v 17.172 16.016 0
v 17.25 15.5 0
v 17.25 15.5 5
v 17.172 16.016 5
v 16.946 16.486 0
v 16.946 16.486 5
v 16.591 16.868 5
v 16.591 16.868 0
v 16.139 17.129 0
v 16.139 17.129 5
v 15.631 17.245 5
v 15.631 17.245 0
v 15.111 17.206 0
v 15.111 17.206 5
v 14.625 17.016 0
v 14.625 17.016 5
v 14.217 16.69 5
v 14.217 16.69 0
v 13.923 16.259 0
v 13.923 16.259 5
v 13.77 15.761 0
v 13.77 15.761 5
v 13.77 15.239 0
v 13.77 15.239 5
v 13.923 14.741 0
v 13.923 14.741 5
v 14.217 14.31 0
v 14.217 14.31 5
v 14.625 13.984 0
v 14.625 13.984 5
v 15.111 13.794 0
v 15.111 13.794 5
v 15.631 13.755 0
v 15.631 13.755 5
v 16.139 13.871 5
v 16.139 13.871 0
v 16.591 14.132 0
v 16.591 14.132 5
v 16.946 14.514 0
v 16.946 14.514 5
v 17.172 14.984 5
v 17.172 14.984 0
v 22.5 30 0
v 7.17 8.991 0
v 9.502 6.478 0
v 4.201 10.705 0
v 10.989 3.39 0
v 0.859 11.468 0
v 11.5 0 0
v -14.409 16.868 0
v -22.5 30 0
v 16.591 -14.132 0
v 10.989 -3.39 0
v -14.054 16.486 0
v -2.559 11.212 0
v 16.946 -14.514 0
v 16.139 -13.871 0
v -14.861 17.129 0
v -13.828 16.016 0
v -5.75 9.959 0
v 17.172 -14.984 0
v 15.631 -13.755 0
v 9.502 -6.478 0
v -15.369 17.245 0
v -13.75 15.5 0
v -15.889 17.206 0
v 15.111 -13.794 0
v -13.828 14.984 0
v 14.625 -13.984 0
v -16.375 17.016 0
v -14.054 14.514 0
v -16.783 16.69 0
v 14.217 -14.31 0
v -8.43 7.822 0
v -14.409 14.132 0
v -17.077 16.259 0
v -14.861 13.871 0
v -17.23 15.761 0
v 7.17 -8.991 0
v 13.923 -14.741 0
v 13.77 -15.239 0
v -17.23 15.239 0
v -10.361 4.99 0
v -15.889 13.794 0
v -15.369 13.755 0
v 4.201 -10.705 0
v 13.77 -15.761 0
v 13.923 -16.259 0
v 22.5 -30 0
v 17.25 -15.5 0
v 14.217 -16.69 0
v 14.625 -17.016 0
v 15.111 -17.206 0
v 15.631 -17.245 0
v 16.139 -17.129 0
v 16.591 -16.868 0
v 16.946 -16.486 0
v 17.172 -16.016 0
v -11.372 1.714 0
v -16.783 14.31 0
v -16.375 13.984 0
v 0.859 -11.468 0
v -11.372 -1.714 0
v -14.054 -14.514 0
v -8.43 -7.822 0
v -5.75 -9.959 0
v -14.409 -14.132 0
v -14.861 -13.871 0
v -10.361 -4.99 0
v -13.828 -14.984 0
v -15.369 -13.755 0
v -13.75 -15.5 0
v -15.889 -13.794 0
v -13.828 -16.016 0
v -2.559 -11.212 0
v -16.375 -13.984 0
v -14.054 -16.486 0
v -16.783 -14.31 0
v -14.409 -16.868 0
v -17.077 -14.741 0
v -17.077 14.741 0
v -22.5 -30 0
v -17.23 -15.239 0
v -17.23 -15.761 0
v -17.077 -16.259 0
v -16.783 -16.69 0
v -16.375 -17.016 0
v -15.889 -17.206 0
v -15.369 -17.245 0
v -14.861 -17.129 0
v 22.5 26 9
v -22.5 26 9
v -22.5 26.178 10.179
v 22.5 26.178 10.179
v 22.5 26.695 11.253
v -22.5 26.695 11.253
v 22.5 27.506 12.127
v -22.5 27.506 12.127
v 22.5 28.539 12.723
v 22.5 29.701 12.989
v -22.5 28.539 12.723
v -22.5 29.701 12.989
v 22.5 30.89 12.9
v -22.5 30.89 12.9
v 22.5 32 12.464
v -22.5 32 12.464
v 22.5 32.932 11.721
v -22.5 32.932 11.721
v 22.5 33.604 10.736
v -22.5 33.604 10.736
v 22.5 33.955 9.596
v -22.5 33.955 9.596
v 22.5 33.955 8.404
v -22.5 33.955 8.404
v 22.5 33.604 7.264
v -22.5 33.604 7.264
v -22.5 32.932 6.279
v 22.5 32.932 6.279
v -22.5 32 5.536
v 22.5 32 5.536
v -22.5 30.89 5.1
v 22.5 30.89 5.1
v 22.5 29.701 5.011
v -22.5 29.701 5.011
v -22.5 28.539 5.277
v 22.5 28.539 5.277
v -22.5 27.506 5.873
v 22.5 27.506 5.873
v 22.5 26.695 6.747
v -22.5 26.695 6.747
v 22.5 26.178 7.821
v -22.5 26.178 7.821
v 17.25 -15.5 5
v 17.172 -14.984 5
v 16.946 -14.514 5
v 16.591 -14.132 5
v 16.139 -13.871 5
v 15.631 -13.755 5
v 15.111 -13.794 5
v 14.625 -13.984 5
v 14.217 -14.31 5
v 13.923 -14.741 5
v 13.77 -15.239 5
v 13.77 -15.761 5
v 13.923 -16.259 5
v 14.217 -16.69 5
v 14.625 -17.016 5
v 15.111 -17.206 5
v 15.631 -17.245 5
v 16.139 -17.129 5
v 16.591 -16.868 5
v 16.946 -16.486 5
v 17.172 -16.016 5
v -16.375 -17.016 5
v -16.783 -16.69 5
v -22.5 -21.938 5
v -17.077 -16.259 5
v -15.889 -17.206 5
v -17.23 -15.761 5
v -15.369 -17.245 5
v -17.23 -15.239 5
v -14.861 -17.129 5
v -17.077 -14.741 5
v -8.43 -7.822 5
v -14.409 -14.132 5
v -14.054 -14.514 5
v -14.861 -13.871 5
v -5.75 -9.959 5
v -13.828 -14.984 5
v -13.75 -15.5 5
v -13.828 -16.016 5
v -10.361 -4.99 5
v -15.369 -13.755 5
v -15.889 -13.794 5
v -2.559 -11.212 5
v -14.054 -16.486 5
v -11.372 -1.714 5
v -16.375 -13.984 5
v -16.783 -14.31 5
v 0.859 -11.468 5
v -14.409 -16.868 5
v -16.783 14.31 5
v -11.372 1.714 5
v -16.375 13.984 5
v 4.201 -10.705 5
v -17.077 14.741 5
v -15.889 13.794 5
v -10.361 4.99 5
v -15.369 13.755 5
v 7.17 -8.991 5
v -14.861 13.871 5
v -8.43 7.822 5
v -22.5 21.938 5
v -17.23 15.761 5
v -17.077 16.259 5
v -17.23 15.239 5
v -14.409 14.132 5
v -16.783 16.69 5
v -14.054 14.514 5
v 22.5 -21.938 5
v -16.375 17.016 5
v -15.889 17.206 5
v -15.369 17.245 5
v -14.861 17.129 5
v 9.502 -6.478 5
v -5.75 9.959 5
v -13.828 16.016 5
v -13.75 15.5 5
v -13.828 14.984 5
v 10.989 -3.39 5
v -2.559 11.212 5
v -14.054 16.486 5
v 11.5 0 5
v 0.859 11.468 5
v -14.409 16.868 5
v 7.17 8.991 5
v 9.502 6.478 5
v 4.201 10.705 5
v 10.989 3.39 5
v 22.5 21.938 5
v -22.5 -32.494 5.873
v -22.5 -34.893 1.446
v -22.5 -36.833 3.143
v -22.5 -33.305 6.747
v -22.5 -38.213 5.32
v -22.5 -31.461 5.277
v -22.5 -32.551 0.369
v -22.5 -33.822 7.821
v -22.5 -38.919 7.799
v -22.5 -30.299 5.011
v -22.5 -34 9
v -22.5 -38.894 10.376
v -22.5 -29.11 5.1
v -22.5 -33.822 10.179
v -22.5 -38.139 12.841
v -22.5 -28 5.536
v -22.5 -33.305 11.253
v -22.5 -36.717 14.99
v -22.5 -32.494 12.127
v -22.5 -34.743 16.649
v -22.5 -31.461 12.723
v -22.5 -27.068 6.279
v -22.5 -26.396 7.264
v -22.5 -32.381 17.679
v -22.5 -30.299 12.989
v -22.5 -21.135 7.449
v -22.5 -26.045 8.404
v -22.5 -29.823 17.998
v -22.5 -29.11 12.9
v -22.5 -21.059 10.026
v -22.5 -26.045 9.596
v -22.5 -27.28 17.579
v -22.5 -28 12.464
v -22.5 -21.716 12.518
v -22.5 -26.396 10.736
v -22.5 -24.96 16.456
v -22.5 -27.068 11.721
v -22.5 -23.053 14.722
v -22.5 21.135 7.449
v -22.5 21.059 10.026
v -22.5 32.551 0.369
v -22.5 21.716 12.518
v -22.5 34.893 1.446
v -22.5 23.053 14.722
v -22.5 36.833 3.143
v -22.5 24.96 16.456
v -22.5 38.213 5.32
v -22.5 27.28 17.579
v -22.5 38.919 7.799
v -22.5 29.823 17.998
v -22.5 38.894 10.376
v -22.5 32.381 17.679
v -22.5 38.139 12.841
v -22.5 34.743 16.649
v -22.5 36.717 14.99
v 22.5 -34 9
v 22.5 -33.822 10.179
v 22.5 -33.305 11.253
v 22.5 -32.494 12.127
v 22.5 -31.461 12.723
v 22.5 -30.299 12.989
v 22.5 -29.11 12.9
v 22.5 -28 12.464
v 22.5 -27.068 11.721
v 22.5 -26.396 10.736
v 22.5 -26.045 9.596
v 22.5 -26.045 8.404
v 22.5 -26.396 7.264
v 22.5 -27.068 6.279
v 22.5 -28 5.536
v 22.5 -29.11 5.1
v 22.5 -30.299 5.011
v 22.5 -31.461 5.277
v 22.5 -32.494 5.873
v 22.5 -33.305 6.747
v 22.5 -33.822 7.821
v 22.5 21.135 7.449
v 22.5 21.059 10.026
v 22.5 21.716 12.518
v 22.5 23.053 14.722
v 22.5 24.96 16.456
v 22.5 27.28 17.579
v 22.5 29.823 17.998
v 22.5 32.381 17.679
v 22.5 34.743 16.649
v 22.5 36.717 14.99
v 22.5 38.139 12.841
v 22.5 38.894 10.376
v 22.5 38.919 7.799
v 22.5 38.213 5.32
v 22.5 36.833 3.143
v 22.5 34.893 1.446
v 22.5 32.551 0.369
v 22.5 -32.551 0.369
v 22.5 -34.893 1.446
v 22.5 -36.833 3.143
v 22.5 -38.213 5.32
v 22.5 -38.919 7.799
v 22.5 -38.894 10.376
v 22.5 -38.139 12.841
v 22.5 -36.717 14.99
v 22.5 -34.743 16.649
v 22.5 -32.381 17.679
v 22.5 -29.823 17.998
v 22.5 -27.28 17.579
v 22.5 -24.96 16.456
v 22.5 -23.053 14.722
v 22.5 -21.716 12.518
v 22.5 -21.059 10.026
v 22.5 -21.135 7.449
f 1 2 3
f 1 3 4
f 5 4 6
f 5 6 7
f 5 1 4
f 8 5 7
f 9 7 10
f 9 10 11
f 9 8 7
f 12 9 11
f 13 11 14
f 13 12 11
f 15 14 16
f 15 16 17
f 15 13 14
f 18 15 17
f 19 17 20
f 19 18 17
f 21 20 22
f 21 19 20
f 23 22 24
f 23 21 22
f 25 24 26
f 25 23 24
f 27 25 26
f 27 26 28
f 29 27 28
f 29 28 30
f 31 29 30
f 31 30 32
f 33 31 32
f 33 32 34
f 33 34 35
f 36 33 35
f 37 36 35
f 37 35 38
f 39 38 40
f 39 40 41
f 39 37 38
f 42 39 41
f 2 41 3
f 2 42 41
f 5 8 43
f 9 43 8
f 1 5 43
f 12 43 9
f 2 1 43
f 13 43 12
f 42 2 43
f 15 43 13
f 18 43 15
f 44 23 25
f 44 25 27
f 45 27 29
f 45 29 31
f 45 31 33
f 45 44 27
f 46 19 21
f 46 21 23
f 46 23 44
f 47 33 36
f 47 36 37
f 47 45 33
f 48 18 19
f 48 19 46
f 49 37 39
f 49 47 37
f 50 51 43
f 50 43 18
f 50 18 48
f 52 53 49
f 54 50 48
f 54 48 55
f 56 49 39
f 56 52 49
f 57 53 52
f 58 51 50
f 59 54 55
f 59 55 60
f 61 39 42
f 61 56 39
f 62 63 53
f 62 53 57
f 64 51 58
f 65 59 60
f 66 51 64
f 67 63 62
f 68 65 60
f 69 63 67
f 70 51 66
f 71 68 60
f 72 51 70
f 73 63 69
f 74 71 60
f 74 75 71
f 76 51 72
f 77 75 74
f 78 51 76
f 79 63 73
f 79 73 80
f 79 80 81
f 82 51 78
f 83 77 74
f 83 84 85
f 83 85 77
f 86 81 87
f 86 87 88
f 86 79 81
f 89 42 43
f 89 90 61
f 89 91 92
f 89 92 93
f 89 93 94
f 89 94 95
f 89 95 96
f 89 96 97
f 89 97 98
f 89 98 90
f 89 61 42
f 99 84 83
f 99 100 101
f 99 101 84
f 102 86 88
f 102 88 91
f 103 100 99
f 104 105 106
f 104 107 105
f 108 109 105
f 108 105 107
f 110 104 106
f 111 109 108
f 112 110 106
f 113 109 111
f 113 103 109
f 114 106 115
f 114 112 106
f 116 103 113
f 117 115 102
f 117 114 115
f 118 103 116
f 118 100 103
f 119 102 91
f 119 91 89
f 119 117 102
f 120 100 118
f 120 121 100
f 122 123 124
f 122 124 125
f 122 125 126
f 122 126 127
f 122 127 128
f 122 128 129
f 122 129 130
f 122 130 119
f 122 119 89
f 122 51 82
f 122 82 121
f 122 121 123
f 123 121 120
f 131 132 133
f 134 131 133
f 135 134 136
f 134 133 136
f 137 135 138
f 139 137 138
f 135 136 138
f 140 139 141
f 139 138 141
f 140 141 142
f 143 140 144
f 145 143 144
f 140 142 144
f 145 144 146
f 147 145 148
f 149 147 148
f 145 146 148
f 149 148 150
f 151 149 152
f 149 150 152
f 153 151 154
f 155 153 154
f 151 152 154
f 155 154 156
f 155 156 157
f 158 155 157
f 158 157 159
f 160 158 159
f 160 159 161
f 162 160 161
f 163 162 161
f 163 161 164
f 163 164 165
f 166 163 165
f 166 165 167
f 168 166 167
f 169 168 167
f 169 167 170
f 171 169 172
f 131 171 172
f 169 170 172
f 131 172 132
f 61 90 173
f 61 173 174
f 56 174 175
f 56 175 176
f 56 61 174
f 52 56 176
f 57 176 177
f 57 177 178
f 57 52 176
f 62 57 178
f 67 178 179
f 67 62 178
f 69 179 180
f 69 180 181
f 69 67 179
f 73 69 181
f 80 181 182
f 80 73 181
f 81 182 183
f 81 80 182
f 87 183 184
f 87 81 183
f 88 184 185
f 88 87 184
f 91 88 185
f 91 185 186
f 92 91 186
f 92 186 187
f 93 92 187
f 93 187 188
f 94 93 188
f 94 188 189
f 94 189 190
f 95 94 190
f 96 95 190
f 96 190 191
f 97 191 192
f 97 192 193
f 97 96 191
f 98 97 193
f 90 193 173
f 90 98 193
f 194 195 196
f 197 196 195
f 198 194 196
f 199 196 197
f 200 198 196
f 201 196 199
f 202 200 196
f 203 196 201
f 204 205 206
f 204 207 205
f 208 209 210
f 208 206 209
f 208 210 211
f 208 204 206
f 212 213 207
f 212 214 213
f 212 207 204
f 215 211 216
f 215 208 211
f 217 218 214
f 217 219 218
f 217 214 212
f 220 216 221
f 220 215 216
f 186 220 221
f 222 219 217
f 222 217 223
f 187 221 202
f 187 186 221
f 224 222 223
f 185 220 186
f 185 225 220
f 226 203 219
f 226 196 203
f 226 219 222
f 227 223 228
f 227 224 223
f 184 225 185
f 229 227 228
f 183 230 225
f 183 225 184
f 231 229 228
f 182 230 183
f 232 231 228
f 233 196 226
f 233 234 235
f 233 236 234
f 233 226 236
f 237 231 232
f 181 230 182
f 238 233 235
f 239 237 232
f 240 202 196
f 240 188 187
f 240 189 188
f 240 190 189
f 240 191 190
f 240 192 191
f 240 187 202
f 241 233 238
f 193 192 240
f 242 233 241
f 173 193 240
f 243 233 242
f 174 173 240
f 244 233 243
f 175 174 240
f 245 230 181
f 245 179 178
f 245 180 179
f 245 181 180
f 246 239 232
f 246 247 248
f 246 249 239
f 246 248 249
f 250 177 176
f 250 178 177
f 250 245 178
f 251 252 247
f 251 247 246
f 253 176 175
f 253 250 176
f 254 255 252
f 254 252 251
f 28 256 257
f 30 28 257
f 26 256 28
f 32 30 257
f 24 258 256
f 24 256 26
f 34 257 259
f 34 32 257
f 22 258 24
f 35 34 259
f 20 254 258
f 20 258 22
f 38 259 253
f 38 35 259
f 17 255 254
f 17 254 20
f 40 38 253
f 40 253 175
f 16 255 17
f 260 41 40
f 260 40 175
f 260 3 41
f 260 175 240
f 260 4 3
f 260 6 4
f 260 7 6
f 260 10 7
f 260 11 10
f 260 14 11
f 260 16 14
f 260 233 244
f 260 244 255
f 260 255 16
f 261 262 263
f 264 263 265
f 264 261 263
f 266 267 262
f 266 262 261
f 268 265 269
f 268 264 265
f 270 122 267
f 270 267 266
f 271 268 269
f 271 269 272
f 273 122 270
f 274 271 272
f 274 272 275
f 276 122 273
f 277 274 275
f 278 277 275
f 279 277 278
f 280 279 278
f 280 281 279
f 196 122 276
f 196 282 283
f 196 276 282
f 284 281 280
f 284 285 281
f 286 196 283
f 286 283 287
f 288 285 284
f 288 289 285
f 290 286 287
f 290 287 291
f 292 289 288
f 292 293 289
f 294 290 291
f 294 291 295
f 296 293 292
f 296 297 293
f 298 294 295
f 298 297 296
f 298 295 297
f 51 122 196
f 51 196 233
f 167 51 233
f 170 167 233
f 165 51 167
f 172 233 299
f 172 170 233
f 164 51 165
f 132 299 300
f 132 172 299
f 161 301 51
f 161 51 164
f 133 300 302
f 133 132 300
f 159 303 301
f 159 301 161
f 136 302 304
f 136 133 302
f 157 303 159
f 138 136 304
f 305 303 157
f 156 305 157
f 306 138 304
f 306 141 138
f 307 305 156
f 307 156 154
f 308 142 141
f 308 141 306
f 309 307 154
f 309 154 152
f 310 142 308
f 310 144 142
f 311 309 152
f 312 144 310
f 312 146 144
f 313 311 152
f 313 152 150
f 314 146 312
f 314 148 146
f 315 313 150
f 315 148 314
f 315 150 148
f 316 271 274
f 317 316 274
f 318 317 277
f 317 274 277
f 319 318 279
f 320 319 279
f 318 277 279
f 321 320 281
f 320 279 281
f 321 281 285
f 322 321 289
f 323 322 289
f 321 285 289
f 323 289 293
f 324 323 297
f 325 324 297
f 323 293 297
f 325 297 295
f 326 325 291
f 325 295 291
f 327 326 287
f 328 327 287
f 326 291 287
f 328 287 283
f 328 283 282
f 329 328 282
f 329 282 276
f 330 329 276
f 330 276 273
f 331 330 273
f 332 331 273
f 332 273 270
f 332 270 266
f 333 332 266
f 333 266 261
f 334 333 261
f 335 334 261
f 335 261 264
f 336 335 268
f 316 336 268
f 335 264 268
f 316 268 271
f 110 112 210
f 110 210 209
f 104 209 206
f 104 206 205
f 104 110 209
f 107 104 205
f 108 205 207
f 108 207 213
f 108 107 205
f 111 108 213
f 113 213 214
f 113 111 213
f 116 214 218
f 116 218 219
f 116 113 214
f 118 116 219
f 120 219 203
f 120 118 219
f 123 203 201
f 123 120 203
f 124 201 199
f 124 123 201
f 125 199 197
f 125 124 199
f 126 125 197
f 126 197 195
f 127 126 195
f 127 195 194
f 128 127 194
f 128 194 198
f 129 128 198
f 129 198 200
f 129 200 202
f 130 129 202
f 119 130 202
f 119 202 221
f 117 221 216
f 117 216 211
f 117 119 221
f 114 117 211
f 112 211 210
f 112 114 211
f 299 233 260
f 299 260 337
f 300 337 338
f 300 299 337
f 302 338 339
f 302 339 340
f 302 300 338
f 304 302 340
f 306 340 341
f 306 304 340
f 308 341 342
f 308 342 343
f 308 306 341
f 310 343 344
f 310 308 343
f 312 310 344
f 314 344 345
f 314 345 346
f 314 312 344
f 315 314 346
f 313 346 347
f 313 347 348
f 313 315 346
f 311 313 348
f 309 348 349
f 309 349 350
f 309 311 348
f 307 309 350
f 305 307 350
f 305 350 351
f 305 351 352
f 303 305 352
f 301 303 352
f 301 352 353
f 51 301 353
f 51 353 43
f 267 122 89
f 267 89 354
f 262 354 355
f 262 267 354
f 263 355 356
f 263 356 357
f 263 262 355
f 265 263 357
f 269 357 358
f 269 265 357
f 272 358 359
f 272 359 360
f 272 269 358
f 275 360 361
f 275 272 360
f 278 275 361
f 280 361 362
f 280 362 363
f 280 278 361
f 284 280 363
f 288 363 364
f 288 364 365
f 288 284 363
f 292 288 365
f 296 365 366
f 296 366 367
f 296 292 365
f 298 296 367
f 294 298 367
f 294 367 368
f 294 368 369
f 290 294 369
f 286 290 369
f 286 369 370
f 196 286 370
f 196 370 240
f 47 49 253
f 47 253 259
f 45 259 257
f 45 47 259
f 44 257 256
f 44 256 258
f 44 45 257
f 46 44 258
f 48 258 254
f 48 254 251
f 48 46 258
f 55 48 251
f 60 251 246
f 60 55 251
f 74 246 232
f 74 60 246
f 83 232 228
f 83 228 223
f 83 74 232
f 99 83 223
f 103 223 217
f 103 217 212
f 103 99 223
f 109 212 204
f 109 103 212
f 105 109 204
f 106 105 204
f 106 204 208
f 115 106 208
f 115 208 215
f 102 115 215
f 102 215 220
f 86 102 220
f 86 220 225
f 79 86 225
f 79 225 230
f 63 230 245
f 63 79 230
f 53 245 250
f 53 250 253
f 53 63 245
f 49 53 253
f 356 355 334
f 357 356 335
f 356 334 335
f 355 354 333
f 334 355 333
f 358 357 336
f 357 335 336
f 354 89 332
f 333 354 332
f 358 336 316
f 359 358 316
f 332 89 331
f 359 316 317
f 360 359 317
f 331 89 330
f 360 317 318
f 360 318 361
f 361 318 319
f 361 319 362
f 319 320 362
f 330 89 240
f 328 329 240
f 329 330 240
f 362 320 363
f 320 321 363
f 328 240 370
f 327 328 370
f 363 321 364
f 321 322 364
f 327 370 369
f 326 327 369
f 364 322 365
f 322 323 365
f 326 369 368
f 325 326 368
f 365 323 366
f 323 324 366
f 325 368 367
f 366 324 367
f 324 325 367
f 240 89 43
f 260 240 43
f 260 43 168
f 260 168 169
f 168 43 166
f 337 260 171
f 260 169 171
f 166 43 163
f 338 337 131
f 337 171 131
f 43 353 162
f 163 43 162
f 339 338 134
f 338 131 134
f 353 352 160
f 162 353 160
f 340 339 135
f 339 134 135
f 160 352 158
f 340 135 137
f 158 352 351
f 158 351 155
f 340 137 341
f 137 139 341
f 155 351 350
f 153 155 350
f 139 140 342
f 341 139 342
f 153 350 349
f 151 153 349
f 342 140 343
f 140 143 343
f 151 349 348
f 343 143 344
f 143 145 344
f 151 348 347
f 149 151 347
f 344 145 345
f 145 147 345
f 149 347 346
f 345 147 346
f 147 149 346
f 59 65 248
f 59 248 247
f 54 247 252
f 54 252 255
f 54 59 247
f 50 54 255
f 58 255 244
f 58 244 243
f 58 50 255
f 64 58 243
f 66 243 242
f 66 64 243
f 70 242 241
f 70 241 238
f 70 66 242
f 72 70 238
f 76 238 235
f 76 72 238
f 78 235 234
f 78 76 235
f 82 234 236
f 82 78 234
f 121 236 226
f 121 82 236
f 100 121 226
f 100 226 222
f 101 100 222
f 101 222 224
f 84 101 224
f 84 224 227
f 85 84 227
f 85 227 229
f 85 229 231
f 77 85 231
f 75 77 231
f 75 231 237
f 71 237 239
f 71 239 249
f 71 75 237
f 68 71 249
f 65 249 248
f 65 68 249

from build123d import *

# Parameters (mm, degrees)
ESBO_O1_W                = 45
ESBO_O1_H                = 45
ESBO_O1_R                = 1.75
ESBO_O1_R_2              = 11.5
RESSALTO_EXTRUS_O1_DEPTH = 5
ESBO_O3_R                = 4
RESSALTO_EXTRUS_O2_DEPTH = 45


with BuildPart() as part:
    # Esboço1 → Ressalto-extrusão1 (new body)
    with BuildSketch(Plane.XY):
        Rectangle(ESBO_O1_W, ESBO_O1_H)
        with Locations((-15.5, 15.5)):
            Circle(ESBO_O1_R, mode=Mode.SUBTRACT)
        with Locations((15.5, 15.5)):
            Circle(ESBO_O1_R, mode=Mode.SUBTRACT)
        with Locations((15.5, -15.5)):
            Circle(ESBO_O1_R, mode=Mode.SUBTRACT)
        with Locations((-15.5, -15.5)):
            Circle(ESBO_O1_R, mode=Mode.SUBTRACT)
        Circle(ESBO_O1_R_2, mode=Mode.SUBTRACT)
    extrude(amount=RESSALTO_EXTRUS_O1_DEPTH)

    # Esboço3 → Ressalto-extrusão2 (add)
    # profile 1 of 2: a face of its own
    with BuildSketch(Plane.ZY.offset(22.5)):
        with BuildLine():
            Line((0, 30), (0, 21.937742252))
            Line((0, 21.937742252), (5, 21.937742252))
            ThreePointArc((5, 21.937742252), (16.64852927, 34.74341649), (0, 30))
        make_face()
        with Locations(Location((9, 30, 0), (0, 0, 270))):
            Circle(ESBO_O3_R, mode=Mode.SUBTRACT)
    # profile 2 of 2: a face of its own
    with BuildSketch(Plane.ZY.offset(22.5)):
        with BuildLine():
            Line((5, -21.937742252), (0, -21.937742252))
            Line((0, -21.937742252), (0, -30))
            ThreePointArc((0, -30), (16.64852927, -34.74341649), (5, -21.937742252))
        make_face()
        with Locations(Location((9, -30, 0), (0, 0, 270))):
            Circle(ESBO_O3_R, mode=Mode.SUBTRACT)
    extrude(amount=-RESSALTO_EXTRUS_O2_DEPTH)


solid = part.part
